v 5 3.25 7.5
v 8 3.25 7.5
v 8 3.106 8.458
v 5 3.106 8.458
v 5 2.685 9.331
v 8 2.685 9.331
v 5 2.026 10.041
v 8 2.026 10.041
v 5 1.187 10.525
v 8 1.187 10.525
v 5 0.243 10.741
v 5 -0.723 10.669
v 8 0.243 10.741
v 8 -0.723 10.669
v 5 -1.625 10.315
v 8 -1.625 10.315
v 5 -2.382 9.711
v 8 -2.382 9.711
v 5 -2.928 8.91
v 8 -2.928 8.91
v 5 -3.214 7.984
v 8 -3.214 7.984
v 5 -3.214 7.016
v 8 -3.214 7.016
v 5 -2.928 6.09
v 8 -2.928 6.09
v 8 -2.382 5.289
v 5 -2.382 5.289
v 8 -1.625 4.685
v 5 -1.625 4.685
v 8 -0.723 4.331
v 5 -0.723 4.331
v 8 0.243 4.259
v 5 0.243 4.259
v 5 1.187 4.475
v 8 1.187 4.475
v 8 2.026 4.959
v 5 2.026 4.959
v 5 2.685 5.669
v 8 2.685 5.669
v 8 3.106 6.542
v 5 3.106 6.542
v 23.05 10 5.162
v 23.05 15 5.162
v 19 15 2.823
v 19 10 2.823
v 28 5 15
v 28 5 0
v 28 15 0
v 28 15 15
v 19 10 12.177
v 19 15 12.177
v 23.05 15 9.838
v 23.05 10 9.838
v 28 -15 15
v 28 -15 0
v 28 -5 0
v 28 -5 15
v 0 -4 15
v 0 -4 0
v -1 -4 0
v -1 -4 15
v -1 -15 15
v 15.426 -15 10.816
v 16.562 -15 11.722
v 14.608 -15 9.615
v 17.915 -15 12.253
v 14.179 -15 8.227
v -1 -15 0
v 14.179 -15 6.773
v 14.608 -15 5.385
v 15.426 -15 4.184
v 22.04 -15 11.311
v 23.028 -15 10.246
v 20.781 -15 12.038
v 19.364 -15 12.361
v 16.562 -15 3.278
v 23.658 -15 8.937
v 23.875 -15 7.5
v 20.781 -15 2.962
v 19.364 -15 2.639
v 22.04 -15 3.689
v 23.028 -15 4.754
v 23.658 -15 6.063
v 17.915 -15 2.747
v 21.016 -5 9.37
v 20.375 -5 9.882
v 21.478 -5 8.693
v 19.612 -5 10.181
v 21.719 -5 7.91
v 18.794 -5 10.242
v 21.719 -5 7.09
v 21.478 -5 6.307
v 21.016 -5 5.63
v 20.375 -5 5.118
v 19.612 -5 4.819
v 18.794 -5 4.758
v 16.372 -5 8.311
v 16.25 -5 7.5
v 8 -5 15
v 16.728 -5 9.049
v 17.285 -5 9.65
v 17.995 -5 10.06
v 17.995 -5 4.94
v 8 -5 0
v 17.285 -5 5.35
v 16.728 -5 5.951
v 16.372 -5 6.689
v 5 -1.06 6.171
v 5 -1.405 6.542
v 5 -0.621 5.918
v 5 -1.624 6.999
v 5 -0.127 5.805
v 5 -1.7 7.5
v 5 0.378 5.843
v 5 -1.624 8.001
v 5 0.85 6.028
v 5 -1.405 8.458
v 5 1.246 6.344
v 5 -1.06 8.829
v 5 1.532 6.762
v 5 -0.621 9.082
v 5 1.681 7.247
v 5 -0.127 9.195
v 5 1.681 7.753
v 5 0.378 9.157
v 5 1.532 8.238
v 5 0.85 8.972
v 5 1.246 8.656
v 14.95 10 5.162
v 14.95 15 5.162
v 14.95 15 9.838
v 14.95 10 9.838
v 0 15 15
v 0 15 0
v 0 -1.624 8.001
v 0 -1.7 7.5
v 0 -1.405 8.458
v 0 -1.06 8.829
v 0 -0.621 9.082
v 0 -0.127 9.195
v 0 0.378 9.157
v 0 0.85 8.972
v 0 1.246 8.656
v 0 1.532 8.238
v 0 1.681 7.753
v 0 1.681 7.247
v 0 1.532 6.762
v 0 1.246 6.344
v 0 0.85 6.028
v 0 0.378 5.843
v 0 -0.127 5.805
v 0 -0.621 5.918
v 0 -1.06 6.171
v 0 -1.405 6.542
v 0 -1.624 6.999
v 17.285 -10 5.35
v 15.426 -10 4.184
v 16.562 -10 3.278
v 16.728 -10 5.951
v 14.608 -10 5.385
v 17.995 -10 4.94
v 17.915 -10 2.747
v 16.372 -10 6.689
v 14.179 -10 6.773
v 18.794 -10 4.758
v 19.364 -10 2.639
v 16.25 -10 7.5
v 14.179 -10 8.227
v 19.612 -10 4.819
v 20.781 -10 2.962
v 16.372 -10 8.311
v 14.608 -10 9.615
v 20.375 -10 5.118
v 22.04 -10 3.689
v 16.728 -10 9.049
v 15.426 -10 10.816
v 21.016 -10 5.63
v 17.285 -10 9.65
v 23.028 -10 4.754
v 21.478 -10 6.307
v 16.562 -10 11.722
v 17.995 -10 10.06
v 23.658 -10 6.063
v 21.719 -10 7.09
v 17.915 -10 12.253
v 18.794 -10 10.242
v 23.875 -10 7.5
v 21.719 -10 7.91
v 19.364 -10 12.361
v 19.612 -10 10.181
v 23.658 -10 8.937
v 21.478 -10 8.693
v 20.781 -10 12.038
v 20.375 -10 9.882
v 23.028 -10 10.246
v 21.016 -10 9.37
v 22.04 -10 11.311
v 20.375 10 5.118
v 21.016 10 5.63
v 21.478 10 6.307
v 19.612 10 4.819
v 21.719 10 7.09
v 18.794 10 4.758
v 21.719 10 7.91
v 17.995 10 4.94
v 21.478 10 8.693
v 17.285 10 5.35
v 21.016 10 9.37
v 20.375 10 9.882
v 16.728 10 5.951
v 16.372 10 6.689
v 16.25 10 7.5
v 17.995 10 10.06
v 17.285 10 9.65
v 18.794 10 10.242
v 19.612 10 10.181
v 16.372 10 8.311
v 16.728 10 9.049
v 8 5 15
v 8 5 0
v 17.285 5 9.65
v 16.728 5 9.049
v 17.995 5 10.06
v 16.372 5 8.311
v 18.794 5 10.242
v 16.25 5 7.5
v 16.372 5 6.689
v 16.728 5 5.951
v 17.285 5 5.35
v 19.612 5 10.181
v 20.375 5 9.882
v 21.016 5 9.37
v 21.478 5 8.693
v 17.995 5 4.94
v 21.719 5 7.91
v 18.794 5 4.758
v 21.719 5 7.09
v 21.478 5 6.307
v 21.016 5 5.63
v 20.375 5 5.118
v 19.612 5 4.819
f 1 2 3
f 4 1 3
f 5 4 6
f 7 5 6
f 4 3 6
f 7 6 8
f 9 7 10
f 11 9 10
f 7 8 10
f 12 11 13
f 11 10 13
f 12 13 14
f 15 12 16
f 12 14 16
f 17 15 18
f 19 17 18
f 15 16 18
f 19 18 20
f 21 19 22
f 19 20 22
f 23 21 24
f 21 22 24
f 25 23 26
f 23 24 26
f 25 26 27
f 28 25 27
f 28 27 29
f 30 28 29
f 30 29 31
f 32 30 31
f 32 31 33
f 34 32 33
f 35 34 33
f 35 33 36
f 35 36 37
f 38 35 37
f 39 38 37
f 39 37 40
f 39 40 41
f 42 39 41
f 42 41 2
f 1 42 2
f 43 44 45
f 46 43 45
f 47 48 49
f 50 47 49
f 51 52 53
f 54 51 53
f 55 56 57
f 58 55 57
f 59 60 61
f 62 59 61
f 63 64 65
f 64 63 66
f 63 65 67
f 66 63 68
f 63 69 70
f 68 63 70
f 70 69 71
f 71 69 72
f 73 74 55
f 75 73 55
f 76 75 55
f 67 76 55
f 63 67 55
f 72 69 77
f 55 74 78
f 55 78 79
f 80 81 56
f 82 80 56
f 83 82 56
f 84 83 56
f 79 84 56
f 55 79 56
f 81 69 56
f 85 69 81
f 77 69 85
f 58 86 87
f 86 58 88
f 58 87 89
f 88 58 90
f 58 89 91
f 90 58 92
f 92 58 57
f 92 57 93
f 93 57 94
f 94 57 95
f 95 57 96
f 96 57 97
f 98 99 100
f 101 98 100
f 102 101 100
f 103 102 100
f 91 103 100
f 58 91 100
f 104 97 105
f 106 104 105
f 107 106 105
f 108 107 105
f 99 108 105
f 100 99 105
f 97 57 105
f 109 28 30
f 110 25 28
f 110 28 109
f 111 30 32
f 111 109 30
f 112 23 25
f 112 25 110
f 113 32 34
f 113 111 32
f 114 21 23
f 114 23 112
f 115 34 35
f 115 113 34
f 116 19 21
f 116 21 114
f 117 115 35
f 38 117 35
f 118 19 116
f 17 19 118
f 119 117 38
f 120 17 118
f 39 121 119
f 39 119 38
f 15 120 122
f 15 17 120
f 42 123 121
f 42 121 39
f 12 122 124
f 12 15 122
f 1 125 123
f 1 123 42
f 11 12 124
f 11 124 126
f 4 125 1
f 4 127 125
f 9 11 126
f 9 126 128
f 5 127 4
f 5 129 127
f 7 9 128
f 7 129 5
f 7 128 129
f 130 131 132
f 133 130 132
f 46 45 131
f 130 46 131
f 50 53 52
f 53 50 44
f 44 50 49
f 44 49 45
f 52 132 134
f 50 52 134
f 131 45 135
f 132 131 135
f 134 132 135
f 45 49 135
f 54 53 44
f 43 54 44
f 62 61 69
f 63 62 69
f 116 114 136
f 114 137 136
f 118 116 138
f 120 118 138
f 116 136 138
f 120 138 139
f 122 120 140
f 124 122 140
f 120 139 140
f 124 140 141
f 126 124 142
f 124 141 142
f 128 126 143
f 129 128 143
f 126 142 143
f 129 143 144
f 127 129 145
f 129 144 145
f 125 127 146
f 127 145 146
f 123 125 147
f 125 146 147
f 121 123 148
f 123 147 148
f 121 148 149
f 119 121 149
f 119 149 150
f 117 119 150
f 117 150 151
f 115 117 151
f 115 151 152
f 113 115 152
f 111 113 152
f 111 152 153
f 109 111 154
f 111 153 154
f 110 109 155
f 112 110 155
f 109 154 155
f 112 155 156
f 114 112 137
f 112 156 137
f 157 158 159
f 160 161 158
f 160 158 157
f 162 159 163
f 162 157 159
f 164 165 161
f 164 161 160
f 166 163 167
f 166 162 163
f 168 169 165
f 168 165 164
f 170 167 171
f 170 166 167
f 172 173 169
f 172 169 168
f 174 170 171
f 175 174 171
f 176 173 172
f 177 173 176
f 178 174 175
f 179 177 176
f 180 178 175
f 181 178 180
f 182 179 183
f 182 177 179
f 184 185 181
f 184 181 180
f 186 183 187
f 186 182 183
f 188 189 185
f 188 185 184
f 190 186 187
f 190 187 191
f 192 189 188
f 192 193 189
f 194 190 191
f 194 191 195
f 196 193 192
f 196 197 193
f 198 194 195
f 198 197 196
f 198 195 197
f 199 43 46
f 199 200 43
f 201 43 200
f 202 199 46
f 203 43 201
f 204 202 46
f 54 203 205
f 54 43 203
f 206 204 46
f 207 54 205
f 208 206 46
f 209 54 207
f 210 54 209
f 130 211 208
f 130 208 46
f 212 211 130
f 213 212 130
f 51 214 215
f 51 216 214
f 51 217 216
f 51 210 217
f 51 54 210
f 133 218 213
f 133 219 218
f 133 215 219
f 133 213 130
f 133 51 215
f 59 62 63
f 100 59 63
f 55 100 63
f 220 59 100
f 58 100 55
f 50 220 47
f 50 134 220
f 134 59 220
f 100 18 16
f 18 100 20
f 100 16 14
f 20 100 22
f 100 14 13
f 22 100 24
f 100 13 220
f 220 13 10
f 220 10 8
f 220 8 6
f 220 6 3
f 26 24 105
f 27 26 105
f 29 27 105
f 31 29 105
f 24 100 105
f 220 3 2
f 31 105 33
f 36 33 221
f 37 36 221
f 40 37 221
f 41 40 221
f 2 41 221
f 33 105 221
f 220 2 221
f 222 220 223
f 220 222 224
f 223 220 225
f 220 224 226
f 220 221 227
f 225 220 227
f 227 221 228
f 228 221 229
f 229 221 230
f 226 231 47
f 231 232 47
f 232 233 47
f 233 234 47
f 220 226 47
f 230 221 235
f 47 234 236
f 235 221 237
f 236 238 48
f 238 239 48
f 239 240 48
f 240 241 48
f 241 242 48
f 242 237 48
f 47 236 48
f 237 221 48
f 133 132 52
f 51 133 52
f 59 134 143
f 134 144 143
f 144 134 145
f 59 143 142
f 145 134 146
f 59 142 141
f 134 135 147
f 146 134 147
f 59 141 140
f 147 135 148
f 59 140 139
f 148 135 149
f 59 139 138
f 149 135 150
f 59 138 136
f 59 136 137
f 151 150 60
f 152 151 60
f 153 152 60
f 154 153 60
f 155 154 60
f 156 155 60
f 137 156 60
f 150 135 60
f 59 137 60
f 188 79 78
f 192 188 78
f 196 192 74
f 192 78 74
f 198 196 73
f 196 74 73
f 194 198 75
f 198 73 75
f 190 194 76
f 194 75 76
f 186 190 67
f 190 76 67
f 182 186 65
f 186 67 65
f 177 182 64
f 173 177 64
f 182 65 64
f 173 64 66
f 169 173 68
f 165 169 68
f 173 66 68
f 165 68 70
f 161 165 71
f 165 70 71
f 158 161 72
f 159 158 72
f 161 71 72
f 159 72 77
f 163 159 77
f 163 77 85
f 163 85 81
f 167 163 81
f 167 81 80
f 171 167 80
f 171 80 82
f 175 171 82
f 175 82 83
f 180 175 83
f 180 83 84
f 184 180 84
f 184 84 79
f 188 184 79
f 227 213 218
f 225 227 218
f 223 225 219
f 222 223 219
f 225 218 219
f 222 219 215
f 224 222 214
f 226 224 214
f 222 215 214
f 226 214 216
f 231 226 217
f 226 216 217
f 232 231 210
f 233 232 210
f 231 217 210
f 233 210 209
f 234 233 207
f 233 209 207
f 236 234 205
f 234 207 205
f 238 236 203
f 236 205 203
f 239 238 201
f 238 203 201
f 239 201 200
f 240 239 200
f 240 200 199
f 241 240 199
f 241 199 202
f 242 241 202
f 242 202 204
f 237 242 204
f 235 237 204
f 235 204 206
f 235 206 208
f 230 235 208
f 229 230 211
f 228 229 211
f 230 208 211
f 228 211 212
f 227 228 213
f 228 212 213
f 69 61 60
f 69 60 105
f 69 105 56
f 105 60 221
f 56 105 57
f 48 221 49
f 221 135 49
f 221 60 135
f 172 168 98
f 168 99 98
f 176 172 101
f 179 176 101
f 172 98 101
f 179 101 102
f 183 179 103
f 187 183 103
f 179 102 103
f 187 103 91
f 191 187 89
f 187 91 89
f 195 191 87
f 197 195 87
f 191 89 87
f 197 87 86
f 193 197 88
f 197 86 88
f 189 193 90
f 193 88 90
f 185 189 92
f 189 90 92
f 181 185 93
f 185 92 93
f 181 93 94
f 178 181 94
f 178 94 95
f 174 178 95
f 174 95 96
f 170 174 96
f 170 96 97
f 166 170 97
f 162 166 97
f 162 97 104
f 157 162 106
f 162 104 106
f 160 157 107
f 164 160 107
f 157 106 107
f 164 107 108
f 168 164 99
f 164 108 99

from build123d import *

# Parameters (mm, degrees)
F1_DEPTH       = 15
F3_D           = 5.5
F3_CBORE_D     = 9.75
F3_CBORE_DEPTH = 5
F5_D           = 3.4
F5_CBORE_D     = 6.5
F5_CBORE_DEPTH = 3
F7_DEPTH       = 5


with BuildPart() as f1:
    # F0 (on Top) → F1 (new body)
    with BuildSketch(Plane.XY):
        Polygon((0, 15), (0, 0), (0, -4), (-1, -4), (-1, -15), (28, -15), (28, -5), (8, -5), (8, 0), (8, 5), (28, 5), (28, 15), align=None)
    extrude(amount=F1_DEPTH)

    # F3 (through all)
    with Locations(Plane.XZ.offset(15)):
        with Locations((19, 7.5)):
            CounterBoreHole(F3_D / 2, F3_CBORE_D / 2, F3_CBORE_DEPTH)

    # F5 (through all)
    with Locations(Plane.YZ.offset(8)):
        with Locations((0, 7.5)):
            CounterBoreHole(F5_D / 2, F5_CBORE_D / 2, F5_CBORE_DEPTH)

    # F6 (on face) → F7 (cut)
    with BuildSketch(Plane(origin=(0, 15, 0), x_dir=(-1, 0, 0), z_dir=(0, 1, 0))):
        Polygon((-23.05, 5.1617314098), (-19, 2.8234628196), (-14.95, 5.1617314098), (-14.95, 9.8382685902), (-19, 12.1765371804), (-23.05, 9.8382685902), align=None)
    extrude(amount=-F7_DEPTH, mode=Mode.SUBTRACT)


solid = f1.part
